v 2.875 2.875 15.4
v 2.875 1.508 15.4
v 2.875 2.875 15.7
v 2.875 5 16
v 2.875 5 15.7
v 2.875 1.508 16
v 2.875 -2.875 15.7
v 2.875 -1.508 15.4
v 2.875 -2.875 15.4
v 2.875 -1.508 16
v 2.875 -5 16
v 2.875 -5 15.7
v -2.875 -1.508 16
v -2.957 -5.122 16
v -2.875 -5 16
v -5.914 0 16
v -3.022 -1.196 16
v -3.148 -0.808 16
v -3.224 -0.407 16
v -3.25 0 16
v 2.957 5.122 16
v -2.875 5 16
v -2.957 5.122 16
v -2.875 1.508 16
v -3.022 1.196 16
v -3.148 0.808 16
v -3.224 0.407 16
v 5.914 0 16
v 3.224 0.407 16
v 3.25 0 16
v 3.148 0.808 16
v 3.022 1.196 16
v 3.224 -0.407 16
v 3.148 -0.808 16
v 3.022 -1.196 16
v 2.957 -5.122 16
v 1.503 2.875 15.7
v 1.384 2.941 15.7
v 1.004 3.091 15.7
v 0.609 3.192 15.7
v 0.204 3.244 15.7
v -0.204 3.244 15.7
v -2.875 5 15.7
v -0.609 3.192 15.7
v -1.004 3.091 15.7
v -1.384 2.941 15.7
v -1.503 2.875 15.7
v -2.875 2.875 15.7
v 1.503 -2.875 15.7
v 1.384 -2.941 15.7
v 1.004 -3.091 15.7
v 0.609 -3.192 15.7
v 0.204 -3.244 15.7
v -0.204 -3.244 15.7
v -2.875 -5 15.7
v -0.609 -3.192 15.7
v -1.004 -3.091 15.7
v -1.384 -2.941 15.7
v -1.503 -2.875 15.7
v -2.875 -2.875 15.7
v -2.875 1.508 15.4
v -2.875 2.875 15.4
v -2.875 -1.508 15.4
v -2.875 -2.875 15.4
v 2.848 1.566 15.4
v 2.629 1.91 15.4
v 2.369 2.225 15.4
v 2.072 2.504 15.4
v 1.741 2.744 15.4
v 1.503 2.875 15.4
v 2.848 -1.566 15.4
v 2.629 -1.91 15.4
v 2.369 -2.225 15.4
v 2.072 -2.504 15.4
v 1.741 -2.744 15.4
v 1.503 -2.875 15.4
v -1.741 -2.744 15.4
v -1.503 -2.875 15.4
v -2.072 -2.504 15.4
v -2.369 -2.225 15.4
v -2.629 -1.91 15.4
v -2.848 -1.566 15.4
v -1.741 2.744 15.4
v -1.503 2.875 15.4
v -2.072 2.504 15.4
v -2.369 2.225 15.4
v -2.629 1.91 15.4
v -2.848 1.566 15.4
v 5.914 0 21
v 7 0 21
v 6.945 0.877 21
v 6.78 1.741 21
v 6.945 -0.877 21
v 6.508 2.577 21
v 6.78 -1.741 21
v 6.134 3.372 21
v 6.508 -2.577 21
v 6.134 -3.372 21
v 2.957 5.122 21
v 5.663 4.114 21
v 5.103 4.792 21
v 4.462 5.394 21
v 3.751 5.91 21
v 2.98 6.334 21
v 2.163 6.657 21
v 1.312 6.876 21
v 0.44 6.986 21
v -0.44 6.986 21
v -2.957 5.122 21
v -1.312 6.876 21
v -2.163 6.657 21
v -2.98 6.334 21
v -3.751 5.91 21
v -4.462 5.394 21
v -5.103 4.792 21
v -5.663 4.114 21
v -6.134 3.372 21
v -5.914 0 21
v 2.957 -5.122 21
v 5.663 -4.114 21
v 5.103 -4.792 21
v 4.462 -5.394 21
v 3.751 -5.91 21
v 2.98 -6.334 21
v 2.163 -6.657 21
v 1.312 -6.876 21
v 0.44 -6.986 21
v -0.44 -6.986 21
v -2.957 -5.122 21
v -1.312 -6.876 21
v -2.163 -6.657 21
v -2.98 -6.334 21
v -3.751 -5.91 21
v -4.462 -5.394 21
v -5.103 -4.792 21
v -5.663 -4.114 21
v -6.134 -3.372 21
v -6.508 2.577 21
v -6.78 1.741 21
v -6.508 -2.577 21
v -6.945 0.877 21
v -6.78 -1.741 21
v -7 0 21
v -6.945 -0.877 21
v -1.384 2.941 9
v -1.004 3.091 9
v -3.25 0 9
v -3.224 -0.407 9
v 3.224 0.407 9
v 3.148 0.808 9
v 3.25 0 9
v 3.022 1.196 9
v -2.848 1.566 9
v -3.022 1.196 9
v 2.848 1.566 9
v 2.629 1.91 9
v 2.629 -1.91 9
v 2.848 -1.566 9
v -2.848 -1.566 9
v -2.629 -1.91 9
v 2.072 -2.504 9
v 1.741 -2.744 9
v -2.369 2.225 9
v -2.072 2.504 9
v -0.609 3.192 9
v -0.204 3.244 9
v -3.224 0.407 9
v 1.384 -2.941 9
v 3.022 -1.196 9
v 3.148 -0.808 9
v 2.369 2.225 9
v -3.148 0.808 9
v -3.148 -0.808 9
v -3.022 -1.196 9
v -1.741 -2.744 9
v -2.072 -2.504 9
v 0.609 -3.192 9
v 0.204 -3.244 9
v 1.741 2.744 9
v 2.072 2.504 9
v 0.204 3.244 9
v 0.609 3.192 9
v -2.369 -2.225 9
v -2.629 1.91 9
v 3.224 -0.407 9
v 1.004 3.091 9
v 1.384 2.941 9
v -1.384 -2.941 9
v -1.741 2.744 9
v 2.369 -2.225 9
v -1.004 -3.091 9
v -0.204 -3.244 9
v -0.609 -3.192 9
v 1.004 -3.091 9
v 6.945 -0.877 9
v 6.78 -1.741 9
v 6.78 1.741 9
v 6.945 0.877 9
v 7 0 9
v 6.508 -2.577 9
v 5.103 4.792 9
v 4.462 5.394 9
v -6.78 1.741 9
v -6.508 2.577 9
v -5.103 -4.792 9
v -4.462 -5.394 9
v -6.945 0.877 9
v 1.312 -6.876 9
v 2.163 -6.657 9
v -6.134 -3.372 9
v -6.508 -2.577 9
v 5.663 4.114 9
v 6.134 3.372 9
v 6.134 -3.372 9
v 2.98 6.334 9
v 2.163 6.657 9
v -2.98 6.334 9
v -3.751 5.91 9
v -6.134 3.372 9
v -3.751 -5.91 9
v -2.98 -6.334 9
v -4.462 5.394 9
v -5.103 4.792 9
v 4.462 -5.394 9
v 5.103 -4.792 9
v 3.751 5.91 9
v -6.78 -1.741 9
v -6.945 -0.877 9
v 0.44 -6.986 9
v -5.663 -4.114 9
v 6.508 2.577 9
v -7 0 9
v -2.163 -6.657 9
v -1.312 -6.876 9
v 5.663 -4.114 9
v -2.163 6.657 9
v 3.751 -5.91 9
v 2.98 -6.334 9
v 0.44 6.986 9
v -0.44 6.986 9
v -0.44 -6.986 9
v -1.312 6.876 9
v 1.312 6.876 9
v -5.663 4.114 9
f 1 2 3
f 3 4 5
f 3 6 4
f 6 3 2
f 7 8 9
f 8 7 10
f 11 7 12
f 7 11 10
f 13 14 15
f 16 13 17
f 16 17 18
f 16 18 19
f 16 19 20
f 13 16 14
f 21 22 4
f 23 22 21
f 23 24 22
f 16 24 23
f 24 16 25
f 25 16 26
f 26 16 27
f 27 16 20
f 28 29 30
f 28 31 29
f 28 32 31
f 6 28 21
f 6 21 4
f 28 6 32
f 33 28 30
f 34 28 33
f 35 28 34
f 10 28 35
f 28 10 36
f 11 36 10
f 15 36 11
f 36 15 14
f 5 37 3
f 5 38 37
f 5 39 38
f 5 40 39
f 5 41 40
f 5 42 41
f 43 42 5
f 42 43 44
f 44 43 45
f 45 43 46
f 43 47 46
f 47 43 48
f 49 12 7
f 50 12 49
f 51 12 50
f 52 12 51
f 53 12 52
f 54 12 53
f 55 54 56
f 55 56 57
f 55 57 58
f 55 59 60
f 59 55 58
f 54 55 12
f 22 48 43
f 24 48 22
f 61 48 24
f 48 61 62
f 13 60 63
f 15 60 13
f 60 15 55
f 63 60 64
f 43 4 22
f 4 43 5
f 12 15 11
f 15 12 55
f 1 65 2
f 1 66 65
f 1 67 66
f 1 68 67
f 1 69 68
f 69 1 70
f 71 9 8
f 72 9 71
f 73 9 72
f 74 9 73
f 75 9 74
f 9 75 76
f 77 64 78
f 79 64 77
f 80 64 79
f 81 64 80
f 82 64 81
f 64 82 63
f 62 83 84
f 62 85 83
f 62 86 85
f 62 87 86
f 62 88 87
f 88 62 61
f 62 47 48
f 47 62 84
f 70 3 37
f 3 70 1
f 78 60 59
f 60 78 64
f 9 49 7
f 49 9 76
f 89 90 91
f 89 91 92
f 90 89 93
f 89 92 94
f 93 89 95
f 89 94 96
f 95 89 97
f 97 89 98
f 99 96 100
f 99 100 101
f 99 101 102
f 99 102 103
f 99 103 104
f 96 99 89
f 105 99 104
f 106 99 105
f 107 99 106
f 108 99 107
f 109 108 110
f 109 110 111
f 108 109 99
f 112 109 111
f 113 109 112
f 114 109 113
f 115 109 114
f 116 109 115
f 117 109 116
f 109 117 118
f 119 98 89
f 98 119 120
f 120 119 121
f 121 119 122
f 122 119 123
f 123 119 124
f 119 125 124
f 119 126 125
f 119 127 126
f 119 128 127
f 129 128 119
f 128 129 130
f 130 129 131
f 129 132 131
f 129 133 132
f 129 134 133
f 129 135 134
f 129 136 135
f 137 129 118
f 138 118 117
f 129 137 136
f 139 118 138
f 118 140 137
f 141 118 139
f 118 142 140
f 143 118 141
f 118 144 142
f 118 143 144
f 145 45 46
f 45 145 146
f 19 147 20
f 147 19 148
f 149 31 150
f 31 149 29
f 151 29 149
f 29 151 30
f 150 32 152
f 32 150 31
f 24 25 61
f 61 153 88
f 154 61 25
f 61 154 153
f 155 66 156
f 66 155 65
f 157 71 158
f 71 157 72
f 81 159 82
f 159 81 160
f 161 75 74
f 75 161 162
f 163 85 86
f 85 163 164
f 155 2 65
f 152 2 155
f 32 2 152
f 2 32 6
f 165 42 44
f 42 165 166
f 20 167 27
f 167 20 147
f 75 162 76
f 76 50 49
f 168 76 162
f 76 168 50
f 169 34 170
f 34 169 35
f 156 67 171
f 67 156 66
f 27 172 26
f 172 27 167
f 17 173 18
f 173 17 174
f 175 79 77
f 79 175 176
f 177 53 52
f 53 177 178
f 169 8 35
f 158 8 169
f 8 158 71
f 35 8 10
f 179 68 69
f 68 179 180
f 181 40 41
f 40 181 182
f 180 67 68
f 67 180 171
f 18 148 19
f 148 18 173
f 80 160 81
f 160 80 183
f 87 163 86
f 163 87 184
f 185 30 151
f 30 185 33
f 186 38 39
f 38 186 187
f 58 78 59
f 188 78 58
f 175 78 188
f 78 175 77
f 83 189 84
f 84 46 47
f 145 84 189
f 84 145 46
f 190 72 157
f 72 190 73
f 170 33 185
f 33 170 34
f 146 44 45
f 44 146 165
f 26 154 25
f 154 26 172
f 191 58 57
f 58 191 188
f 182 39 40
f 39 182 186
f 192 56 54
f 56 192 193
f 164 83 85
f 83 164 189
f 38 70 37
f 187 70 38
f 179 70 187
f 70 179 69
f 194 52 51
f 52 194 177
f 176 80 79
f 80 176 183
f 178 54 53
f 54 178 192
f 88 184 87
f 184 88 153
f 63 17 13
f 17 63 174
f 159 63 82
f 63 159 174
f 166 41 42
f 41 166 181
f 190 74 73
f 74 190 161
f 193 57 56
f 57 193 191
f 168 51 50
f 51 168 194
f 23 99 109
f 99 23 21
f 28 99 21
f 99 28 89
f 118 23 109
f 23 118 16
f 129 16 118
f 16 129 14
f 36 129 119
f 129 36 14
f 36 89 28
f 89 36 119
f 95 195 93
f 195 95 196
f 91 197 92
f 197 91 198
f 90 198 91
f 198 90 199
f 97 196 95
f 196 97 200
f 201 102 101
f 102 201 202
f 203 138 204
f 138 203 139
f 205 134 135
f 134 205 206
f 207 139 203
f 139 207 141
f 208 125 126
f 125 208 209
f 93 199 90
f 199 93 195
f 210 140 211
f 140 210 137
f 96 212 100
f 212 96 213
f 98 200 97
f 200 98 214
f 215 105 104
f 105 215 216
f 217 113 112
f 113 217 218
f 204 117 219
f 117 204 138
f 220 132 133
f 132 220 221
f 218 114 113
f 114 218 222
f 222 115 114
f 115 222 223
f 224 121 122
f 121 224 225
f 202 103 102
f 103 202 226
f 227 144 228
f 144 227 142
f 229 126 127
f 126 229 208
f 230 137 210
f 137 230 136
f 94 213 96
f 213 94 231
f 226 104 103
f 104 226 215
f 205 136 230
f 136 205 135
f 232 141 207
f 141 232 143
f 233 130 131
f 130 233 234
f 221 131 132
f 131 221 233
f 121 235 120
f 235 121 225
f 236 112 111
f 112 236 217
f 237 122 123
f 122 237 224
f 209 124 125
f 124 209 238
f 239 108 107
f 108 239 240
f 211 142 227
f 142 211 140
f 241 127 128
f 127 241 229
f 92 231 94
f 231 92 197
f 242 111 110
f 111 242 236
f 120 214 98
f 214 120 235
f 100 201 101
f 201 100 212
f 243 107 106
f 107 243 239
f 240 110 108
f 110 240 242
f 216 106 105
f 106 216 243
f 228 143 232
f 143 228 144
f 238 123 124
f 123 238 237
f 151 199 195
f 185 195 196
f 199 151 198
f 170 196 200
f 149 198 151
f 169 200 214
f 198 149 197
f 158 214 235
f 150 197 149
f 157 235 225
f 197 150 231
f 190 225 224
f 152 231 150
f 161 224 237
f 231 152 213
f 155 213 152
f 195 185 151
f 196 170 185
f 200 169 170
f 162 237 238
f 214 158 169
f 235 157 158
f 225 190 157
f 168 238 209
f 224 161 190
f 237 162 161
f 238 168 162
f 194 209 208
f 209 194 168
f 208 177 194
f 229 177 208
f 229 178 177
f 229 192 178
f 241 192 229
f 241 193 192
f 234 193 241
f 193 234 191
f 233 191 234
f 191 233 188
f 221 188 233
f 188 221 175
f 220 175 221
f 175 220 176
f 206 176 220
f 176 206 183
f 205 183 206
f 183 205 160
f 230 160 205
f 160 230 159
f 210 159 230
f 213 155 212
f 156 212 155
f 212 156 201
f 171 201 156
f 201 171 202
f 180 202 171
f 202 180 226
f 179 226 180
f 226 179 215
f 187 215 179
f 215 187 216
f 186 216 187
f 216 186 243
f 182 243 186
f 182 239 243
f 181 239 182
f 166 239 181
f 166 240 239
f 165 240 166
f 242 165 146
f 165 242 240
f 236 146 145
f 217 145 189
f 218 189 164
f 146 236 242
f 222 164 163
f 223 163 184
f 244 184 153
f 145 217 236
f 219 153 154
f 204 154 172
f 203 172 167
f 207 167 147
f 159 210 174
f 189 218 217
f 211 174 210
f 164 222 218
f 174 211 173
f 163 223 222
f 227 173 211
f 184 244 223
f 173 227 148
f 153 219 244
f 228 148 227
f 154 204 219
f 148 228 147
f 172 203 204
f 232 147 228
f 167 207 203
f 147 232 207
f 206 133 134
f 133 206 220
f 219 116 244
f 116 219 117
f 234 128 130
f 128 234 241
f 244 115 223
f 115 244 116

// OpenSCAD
$fn = 50;


difference() {
	union() {
		translate(v = [0, 0, 9.0000000000]) {
			cylinder(h = 12, r = 7.0000000000);
		}
	}
	union() {
		translate(v = [0, 0, 21]) {
			rotate(a = [0, 0, 0]) {
				difference() {
					union() {
						#translate(v = [-2.8750000000, -5.0000000000, -5.3000000000]) {
							cube(size = [5.7500000000, 10, 0.3000000000]);
						}
						#translate(v = [-2.8750000000, -2.8750000000, -5.6000000000]) {
							cube(size = [5.7500000000, 5.7500000000, 0.3000000000]);
						}
						#translate(v = [-2.8750000000, -5.0000000000, 0]) {
							cube(size = [5.7500000000, 10, 0.3000000000]);
						}
						#translate(v = [-2.8750000000, -2.8750000000, 0.3000000000]) {
							cube(size = [5.7500000000, 5.7500000000, 0.3000000000]);
						}
						#translate(v = [0, 0, -100.0000000000]) {
							cylinder(h = 200, r = 3.2500000000);
						}
						translate(v = [0, 0, -5]) {
							#linear_extrude(height = 5) {
								polygon(points = [[5.9142500000, 0.0000000000], [2.9571250000, 5.1218907443], [-2.9571250000, 5.1218907443], [-5.9142500000, 0.0000000000], [-2.9571250000, -5.1218907443], [2.9571250000, -5.1218907443]]);
							}
						}
						#translate(v = [-2.8750000000, -5.0000000000, -5.3000000000]) {
							cube(size = [5.7500000000, 10, 0.3000000000]);
						}
						#translate(v = [-2.8750000000, -2.8750000000, -5.6000000000]) {
							cube(size = [5.7500000000, 5.7500000000, 0.3000000000]);
						}
						#translate(v = [-2.8750000000, -5.0000000000, 0]) {
							cube(size = [5.7500000000, 10, 0.3000000000]);
						}
						#translate(v = [-2.8750000000, -2.8750000000, 0.3000000000]) {
							cube(size = [5.7500000000, 5.7500000000, 0.3000000000]);
						}
						#translate(v = [0, 0, -100.0000000000]) {
							cylinder(h = 200, r = 3.2500000000);
						}
						#translate(v = [-2.8750000000, -5.0000000000, -5.3000000000]) {
							cube(size = [5.7500000000, 10, 0.3000000000]);
						}
						#translate(v = [-2.8750000000, -2.8750000000, -5.6000000000]) {
							cube(size = [5.7500000000, 5.7500000000, 0.3000000000]);
						}
						#translate(v = [-2.8750000000, -5.0000000000, 0]) {
							cube(size = [5.7500000000, 10, 0.3000000000]);
						}
						#translate(v = [-2.8750000000, -2.8750000000, 0.3000000000]) {
							cube(size = [5.7500000000, 5.7500000000, 0.3000000000]);
						}
						#translate(v = [0, 0, -100.0000000000]) {
							cylinder(h = 200, r = 3.2500000000);
						}
					}
					union();
				}
			}
		}
		#translate(v = [0, 0, -100.0000000000]) {
			cylinder(h = 200, r = 3.2500000000);
		}
	}
}
